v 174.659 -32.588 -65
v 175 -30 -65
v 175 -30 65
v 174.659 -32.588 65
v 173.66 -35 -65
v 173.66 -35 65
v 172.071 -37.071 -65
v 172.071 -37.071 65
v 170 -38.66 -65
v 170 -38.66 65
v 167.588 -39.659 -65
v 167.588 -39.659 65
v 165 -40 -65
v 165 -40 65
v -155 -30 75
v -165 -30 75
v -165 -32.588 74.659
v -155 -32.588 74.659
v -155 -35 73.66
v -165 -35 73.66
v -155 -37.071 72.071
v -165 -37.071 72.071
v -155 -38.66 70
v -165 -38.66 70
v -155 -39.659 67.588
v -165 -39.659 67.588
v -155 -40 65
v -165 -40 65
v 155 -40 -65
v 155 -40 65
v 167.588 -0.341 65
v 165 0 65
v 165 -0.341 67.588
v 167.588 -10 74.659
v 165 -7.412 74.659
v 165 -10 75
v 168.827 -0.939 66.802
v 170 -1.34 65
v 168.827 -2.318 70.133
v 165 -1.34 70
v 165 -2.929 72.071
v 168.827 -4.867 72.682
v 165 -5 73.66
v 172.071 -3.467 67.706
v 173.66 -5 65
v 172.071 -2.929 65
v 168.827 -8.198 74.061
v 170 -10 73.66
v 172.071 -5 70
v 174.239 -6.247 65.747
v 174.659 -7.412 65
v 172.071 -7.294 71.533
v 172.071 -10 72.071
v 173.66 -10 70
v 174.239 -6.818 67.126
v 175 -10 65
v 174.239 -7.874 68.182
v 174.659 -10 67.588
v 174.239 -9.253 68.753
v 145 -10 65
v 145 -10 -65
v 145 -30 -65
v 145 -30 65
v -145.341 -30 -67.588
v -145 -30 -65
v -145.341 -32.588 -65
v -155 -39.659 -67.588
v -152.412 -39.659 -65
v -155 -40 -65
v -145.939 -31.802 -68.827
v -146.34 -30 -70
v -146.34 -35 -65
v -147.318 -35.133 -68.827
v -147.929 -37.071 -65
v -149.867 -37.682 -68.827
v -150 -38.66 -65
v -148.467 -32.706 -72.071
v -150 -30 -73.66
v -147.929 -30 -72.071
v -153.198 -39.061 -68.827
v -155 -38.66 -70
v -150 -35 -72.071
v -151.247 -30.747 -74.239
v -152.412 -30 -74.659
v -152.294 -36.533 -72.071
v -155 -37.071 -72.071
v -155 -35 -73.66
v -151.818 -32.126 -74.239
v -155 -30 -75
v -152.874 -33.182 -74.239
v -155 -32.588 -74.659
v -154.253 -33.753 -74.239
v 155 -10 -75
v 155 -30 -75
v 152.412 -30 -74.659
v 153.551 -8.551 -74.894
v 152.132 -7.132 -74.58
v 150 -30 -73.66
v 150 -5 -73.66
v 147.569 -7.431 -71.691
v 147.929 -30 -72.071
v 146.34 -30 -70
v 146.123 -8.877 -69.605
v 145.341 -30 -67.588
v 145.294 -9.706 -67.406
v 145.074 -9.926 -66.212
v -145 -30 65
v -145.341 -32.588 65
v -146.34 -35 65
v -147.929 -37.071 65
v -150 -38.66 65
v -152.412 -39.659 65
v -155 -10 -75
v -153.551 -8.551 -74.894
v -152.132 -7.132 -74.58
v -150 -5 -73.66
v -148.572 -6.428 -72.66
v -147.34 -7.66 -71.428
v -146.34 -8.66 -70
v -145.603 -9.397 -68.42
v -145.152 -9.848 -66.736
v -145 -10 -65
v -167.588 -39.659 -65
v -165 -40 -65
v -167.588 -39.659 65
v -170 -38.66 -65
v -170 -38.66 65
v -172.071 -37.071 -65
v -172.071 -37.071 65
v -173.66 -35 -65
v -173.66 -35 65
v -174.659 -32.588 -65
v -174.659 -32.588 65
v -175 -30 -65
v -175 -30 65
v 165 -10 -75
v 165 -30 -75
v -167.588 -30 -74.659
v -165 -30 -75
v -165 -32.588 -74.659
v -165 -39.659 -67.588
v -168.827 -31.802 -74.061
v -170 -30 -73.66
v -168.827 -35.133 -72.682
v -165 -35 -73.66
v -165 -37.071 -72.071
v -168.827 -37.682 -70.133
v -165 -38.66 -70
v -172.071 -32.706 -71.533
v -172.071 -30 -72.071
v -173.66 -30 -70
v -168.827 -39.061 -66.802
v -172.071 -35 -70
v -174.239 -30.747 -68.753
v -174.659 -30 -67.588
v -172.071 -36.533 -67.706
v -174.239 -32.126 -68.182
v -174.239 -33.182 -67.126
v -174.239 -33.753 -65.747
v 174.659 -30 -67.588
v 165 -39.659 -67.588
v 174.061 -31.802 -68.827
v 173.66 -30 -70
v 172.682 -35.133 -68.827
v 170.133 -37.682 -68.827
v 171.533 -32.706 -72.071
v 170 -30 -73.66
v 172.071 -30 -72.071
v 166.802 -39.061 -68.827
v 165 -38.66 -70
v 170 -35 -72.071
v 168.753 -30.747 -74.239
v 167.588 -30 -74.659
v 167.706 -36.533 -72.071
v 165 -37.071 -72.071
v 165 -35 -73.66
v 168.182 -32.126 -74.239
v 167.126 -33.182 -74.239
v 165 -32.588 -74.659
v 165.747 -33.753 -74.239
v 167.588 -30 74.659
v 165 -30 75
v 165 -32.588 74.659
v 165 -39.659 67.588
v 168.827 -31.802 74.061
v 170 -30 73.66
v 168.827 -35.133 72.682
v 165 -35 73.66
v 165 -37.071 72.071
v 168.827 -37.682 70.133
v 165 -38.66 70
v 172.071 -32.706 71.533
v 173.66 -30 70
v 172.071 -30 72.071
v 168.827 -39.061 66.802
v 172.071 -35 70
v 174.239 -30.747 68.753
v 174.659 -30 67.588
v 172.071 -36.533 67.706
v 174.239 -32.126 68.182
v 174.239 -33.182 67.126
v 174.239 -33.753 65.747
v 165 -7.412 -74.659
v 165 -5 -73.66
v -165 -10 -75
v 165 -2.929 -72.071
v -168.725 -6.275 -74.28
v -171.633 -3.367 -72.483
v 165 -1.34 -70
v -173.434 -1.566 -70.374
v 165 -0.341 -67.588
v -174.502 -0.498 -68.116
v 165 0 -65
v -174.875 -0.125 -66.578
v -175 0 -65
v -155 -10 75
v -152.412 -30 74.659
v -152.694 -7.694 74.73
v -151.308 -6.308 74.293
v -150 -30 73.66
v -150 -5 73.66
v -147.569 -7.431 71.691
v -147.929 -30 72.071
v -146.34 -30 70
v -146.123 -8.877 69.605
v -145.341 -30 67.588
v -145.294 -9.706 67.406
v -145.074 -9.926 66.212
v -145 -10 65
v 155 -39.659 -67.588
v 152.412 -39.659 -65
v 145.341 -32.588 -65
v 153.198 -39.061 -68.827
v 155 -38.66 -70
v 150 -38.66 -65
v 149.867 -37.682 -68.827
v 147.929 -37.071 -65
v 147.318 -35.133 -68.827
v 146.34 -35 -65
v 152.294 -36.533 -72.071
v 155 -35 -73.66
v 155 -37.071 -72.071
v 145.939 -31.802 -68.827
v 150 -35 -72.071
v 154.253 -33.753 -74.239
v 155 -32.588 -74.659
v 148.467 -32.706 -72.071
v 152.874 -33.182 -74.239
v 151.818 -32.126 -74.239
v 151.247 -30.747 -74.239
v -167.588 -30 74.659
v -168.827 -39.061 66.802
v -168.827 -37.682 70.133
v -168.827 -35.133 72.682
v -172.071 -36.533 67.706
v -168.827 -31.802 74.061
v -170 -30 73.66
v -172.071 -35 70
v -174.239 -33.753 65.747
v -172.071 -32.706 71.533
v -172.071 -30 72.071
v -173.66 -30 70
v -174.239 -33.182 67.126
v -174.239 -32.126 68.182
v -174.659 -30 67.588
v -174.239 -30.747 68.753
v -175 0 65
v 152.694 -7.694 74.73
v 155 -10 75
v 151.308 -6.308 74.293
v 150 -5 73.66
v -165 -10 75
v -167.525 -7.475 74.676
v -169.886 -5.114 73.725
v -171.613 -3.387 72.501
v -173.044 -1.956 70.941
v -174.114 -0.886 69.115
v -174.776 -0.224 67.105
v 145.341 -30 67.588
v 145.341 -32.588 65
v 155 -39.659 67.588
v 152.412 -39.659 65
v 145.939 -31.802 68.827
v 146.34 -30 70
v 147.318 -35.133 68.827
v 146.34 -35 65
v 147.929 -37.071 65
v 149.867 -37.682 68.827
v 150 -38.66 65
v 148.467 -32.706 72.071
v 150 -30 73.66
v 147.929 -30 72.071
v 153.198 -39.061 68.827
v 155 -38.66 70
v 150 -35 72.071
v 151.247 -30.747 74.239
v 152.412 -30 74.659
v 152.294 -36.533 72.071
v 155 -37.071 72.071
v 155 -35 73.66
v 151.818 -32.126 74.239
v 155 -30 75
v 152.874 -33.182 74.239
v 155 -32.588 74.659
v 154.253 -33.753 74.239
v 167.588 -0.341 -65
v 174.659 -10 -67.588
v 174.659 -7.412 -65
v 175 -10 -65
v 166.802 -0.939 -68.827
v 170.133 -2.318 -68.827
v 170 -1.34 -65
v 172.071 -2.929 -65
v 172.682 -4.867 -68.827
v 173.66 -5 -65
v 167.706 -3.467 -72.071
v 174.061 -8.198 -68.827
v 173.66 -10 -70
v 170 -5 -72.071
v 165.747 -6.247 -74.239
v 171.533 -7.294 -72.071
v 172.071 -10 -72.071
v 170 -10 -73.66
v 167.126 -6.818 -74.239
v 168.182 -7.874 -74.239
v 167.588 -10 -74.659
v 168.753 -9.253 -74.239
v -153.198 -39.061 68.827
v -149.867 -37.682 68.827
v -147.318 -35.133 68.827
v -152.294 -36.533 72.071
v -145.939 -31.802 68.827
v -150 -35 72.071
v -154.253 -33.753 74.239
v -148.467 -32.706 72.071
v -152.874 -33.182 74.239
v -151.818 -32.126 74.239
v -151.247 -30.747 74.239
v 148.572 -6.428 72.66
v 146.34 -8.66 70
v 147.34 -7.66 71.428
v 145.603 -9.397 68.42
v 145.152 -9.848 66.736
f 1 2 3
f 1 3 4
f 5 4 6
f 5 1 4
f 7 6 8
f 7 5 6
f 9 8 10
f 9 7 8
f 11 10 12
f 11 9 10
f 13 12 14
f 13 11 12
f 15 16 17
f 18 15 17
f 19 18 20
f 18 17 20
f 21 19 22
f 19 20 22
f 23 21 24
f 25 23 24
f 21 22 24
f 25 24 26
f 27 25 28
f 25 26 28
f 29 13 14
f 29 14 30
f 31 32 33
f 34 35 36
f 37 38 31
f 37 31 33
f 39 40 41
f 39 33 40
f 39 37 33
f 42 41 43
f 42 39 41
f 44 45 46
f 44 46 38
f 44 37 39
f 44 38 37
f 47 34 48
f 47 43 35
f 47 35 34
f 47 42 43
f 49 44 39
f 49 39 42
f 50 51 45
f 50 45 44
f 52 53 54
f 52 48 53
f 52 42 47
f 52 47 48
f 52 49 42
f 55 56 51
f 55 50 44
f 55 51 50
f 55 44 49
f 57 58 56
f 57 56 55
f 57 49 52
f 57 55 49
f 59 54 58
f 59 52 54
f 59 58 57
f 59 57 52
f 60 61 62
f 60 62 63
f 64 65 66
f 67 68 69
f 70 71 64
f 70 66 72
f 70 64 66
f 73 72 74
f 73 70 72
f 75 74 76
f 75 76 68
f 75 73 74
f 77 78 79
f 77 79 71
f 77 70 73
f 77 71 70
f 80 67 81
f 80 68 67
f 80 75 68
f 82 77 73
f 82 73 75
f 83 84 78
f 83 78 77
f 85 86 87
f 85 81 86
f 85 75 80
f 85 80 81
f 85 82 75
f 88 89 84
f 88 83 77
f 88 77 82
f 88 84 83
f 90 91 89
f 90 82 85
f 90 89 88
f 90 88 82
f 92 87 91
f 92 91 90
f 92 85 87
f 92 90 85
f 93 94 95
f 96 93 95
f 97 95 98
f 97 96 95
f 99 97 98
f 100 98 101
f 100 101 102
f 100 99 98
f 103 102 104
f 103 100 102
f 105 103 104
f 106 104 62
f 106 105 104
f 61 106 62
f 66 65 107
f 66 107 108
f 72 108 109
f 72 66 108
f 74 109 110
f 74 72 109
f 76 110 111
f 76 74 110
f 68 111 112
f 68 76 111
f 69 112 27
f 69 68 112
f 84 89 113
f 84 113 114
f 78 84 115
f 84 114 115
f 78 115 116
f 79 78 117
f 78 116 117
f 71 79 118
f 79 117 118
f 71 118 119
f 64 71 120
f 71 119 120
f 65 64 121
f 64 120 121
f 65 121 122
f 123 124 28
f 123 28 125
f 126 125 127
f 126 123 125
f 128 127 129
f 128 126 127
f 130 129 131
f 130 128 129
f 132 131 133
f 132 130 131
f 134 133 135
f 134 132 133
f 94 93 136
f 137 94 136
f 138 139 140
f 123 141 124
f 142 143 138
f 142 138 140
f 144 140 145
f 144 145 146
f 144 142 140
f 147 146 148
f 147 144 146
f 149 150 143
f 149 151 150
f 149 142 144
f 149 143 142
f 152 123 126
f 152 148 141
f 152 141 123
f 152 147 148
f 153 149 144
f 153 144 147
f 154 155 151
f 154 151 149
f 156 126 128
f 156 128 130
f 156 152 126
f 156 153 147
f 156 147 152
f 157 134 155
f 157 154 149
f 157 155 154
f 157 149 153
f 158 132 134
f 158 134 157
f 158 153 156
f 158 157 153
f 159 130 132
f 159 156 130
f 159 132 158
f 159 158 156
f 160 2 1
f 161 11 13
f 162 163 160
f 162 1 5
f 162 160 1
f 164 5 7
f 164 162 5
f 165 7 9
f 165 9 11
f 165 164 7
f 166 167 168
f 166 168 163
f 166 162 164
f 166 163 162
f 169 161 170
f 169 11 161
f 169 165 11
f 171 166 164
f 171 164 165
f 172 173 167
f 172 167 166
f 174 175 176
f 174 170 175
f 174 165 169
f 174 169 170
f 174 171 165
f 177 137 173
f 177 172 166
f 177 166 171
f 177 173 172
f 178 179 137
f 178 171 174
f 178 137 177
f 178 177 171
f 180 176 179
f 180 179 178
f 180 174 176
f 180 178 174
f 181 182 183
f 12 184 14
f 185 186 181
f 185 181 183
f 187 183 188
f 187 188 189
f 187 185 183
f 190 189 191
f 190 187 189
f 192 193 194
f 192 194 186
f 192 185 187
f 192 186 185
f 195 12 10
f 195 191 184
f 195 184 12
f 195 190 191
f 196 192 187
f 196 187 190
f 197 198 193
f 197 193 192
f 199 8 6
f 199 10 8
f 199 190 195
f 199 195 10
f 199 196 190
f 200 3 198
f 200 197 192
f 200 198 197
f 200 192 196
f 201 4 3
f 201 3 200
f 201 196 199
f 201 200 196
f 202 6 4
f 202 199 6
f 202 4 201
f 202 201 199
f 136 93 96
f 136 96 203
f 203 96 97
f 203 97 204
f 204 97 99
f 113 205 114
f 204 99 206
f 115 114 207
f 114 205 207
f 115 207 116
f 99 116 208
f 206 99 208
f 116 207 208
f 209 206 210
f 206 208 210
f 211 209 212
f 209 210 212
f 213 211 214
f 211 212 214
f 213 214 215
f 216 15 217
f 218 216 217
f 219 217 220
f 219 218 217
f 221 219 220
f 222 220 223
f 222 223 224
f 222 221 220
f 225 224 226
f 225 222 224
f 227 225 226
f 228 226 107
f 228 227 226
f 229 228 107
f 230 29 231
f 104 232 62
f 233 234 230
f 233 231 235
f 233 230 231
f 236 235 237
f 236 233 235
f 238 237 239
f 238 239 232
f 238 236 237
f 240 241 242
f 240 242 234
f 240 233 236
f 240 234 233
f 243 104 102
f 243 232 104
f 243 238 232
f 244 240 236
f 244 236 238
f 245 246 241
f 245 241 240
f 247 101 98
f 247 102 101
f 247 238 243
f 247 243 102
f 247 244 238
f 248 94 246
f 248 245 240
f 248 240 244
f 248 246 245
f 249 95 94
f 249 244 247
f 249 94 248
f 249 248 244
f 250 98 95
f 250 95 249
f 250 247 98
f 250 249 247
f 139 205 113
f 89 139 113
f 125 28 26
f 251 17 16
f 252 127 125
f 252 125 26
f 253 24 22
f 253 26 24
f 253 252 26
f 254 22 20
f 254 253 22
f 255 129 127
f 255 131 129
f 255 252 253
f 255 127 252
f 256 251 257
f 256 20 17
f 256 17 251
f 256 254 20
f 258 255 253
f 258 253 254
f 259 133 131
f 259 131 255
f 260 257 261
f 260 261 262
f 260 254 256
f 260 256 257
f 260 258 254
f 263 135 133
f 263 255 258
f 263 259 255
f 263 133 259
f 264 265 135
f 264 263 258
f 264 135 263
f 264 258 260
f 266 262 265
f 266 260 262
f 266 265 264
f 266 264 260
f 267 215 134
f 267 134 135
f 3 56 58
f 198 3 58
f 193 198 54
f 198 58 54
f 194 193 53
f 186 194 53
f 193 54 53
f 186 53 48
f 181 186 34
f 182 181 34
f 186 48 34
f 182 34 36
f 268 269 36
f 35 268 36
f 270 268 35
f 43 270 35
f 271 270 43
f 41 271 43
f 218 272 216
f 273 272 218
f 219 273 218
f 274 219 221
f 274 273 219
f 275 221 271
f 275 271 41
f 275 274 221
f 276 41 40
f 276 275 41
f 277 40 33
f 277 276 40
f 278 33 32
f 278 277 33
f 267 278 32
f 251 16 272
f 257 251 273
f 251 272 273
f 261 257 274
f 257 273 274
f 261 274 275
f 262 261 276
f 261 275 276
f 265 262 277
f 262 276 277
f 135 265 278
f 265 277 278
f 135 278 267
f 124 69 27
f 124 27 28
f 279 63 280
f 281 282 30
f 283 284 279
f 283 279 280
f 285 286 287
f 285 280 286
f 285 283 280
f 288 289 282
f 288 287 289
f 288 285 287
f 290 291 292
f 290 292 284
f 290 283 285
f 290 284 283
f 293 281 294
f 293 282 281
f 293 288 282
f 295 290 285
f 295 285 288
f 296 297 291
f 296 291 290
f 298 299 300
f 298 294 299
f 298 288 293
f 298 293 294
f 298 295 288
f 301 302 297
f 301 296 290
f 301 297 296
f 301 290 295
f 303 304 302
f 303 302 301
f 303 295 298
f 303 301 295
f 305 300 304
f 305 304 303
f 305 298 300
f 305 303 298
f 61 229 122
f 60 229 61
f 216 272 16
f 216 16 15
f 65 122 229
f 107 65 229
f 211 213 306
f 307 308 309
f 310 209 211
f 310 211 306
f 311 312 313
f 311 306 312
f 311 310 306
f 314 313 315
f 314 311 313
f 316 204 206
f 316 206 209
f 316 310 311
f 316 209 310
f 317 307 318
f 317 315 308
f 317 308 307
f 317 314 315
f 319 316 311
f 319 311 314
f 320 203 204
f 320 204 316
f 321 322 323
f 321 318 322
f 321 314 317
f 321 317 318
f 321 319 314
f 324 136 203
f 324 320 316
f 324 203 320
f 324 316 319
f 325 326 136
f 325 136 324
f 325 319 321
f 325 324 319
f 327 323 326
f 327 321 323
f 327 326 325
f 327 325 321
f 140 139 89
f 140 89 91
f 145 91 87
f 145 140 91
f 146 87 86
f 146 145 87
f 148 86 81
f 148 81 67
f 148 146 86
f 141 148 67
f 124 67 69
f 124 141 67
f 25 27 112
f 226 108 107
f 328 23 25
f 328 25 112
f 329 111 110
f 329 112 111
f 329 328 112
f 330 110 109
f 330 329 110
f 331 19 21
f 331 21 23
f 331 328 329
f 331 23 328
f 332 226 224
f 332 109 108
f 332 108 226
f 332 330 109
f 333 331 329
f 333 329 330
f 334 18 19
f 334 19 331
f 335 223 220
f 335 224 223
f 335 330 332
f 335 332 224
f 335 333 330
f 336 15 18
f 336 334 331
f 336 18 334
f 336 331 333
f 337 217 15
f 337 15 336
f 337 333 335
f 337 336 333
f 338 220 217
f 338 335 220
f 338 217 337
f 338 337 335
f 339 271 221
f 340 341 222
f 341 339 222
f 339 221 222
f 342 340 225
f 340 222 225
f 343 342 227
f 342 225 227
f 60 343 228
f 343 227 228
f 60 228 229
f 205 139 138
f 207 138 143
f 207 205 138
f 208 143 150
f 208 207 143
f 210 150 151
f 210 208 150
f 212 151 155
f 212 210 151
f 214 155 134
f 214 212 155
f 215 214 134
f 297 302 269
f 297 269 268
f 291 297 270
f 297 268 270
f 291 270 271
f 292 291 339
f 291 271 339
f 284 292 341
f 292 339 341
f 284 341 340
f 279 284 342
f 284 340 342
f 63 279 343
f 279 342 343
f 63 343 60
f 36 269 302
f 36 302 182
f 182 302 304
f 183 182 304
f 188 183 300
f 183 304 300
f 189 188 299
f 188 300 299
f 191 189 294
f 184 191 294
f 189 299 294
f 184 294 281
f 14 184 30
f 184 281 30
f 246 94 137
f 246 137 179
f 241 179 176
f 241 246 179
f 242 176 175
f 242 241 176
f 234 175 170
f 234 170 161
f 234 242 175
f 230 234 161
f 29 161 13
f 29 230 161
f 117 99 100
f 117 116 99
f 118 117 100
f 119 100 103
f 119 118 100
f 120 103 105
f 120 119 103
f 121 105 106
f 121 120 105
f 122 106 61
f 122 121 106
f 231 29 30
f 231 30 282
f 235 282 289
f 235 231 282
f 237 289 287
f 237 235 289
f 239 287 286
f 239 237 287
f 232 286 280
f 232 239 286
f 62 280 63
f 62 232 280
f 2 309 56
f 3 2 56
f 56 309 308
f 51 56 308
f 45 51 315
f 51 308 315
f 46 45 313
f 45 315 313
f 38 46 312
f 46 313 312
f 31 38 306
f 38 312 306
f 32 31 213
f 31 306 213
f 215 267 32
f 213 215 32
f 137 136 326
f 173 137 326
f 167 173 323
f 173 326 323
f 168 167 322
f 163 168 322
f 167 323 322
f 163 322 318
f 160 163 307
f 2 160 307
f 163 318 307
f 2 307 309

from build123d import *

# Parameters (mm, degrees)
F0_W          = 350
F0_H          = 150
F1_DEPTH      = 10
F2_W          = 30
F2_H          = 150
F3_DEPTH      = 40
F4_T1_DEPTH   = 10
F4_T3_DEPTH   = 20
F4_T5_DEPTH   = 130
F4_T7_DEPTH   = 55
F4_T9_DEPTH   = 365
F4_T11_DEPTH  = 290
F4_T13_DEPTH  = 10
F4_S17_W      = 10.2
F4_S17_H      = 10.2
F4_T18_DEPTH  = 10.2
F4_S23_W      = 10.2
F4_S23_H      = 10.2
F4_T24_DEPTH  = 10.2
F4_S29_W      = 10.2
F4_S29_H      = 10.2
F4_T30_DEPTH  = 10.2
F4_S35_W      = 10.2
F4_S35_H      = 10.2
F4_T36_DEPTH  = 10.2
F4_S41_W      = 10.2
F4_S41_H      = 10.2
F4_T42_DEPTH  = 10.2
F4_S47_W      = 10.2
F4_S47_H      = 10.2
F4_T48_DEPTH  = 10.2
F4_S53_W      = 10.2
F4_S53_H      = 10.2
F4_T54_DEPTH  = 10.2
F4_S59_W      = 10.2
F4_S59_H      = 10.2
F4_T60_DEPTH  = 10.2
F4_S65_W      = 10.2
F4_S65_H      = 10.2
F4_T66_DEPTH  = 10.2
F4_S71_W      = 10.2
F4_S71_H      = 10.2
F4_T72_DEPTH  = 10.2
F4_T79_DEPTH  = 45
F4_T84_DEPTH  = 315
F4_T91_DEPTH  = 315
F4_T95_DEPTH  = 45
F4_T103_DEPTH = 45
F4_T108_DEPTH = 315
F4_T115_DEPTH = 315
F4_T119_DEPTH = 45


# Not quite as in the source:
# - a fillet or chamfer that OpenCascade refuses, or shapes differently, is made with other operations: its cross-section is extruded or revolved along the edge and cut away or added


with BuildPart() as f1:
    # F0 (on Front) → F1 (new body)
    with BuildSketch(Plane.XZ):
        Rectangle(F0_W, F0_H)
    extrude(amount=F1_DEPTH)

    # F2 (on face) → F3 (join)
    with BuildSketch(Plane(origin=(0, 0, 0), x_dir=(-1, 0, 0), z_dir=(0, 1, 0))):
        with Locations((-160, 0)):
            Rectangle(F2_W, F2_H)
        with Locations((160, 0)):
            Rectangle(F2_W, F2_H)
    extrude(amount=-F3_DEPTH)

    # F4: fillet of radius 10 on 21 edges, made by hand

    # F4_s2 → F4_t1 (cut)
    with BuildSketch(Plane.YZ.offset(155)):
        with BuildLine():
            ThreePointArc((-30, 75), (-37.0710678119, 72.0710678119), (-40, 65))
            Line((-40, 65), (-40, 75))
            Line((-40, 75), (-30, 75))
        make_face()
        with BuildLine():
            ThreePointArc((-30, -75), (-37.0710678119, -72.0710678119), (-40, -65))
            Line((-40, -65), (-40, -75))
            Line((-40, -75), (-30, -75))
        make_face()
    extrude(amount=F4_T1_DEPTH, mode=Mode.SUBTRACT)

    # F4_s4 → F4_t3 (cut)
    with BuildSketch(Plane.XZ.offset(10)):
        with BuildLine():
            ThreePointArc((155, 75), (147.9289321881, 72.0710678119), (145, 65))
            Line((145, 65), (145, 75))
            Line((145, 75), (155, 75))
        make_face()
        with BuildLine():
            ThreePointArc((165, -75), (172.0710678119, -72.0710678119), (175, -65))
            Line((175, -65), (175, -75))
            Line((175, -75), (165, -75))
        make_face()
        with BuildLine():
            ThreePointArc((155, -75), (147.9289321881, -72.0710678119), (145, -65))
            Line((145, -65), (145, -75))
            Line((145, -75), (155, -75))
        make_face()
        with BuildLine():
            ThreePointArc((175, 65), (172.0710678119, 72.0710678119), (165, 75))
            Line((165, 75), (175, 75))
            Line((175, 75), (175, 65))
        make_face()
        with BuildLine():
            ThreePointArc((-155, -75), (-147.9289321881, -72.0710678119), (-145, -65))
            Line((-145, -65), (-145, -75))
            Line((-145, -75), (-155, -75))
        make_face()
        with BuildLine():
            ThreePointArc((-155, 75), (-147.9289321881, 72.0710678119), (-145, 65))
            Line((-145, 65), (-145, 75))
            Line((-145, 75), (-155, 75))
        make_face()
    extrude(amount=F4_T3_DEPTH, mode=Mode.SUBTRACT)

    # F4_s6 → F4_t5 (cut)
    with BuildSketch(Plane.XY.offset(-65)):
        with BuildLine():
            ThreePointArc((175, -30), (172.0710678119, -37.0710678119), (165, -40))
            Line((165, -40), (175, -40))
            Line((175, -40), (175, -30))
        make_face()
        with BuildLine():
            ThreePointArc((175, -10), (172.0710678119, -2.9289321881), (165, 0))
            Line((165, 0), (175, 0))
            Line((175, 0), (175, -10))
        make_face()
        with BuildLine():
            ThreePointArc((-165, -40), (-172.0710678119, -37.0710678119), (-175, -30))
            Line((-175, -30), (-175, -40))
            Line((-175, -40), (-165, -40))
        make_face()
        with BuildLine():
            ThreePointArc((155, -40), (147.9289321881, -37.0710678119), (145, -30))
            Line((145, -30), (145, -40))
            Line((145, -40), (155, -40))
        make_face()
        with BuildLine():
            ThreePointArc((-145, -30), (-147.9289321881, -37.0710678119), (-155, -40))
            Line((-155, -40), (-145, -40))
            Line((-145, -40), (-145, -30))
        make_face()
    extrude(amount=F4_T5_DEPTH, mode=Mode.SUBTRACT)

    # F4_s8 → F4_t7 (cut)
    with BuildSketch(Plane.XZ.offset(-25)):
        with BuildLine():
            ThreePointArc((-165, -75), (-172.0710678119, -72.0710678119), (-175, -65))
            Line((-175, -65), (-175, -75))
            Line((-175, -75), (-165, -75))
        make_face()
        with BuildLine():
            ThreePointArc((-165, 75), (-172.0710678119, 72.0710678119), (-175, 65))
            Line((-175, 65), (-175, 75))
            Line((-175, 75), (-165, 75))
        make_face()
    extrude(amount=F4_T7_DEPTH, mode=Mode.SUBTRACT)

    # F4_s10 → F4_t9 (cut)
    with BuildSketch(Plane.YZ.offset(-200)):
        with BuildLine():
            ThreePointArc((-10, 75), (-2.9289321881, 72.0710678119), (0, 65))
            Line((0, 65), (0, 75))
            Line((0, 75), (-10, 75))
        make_face()
        with BuildLine():
            ThreePointArc((-10, -75), (-2.9289321881, -72.0710678119), (0, -65))
            Line((0, -65), (0, -75))
            Line((0, -75), (-10, -75))
        make_face()
    extrude(amount=F4_T9_DEPTH, mode=Mode.SUBTRACT)

    # F4_s12 → F4_t11 (cut)
    with BuildSketch(Plane.YZ.offset(-145)):
        with BuildLine():
            ThreePointArc((0, 75), (-7.0710678119, 72.0710678119), (-10, 65))
            Line((-10, 65), (-10, 75))
            Line((-10, 75), (0, 75))
        make_face()
        with BuildLine():
            ThreePointArc((0, -75), (-7.0710678119, -72.0710678119), (-10, -65))
            Line((-10, -65), (-10, -75))
            Line((-10, -75), (0, -75))
        make_face()
    extrude(amount=F4_T11_DEPTH, mode=Mode.SUBTRACT)

    # F4_s14 → F4_t13 (cut)
    with BuildSketch(Plane.YZ.offset(-165)):
        with BuildLine():
            ThreePointArc((-30, 75), (-37.0710678119, 72.0710678119), (-40, 65))
            Line((-40, 65), (-40, 75))
            Line((-40, 75), (-30, 75))
        make_face()
        with BuildLine():
            ThreePointArc((-30, -75), (-37.0710678119, -72.0710678119), (-40, -65))
            Line((-40, -65), (-40, -75))
            Line((-40, -75), (-30, -75))
        make_face()
    extrude(amount=F4_T13_DEPTH, mode=Mode.SUBTRACT)


with BuildPart() as f4_tool16:
    # F4_s17 → F4_t18 (new body)
    with BuildSketch(Plane.XY.offset(65)):
        with Locations((149.9, -35.1)):
            Rectangle(F4_S17_W, F4_S17_H)
    extrude(amount=F4_T18_DEPTH)

    # F4_s19 → F4_t20 (revolve, cut)
    with BuildSketch(Plane(origin=(155, -30, 65), x_dir=(0.7071067812, 0.7071067812, 0), z_dir=(0.7071067812, -0.7071067812, 0))):
        with BuildLine():
            ThreePointArc((0, -10), (10, 0), (0, 10))
            Line((0, 10), (0, -10))
        make_face()
    revolve(axis=Axis((155, -30, 65), (0, 0, 1)), mode=Mode.SUBTRACT)


with BuildPart() as f1_1:
    add(f1.part)

    # F4_t15: cut F4_tool16
    add(f4_tool16.part, mode=Mode.SUBTRACT)


with BuildPart() as f4_tool22:
    # F4_s23 → F4_t24 (new body)
    with BuildSketch(Plane.YZ.offset(165)):
        with Locations((-35.1, 70.1)):
            Rectangle(F4_S23_W, F4_S23_H)
    extrude(amount=F4_T24_DEPTH)

    # F4_s25 → F4_t26 (revolve, cut)
    with BuildSketch(Plane(origin=(165, -30, 65), x_dir=(0, 0.7071067812, -0.7071067812), z_dir=(0, -0.7071067812, -0.7071067812))):
        with BuildLine():
            ThreePointArc((0, -10), (10, 0), (0, 10))
            Line((0, 10), (0, -10))
        make_face()
    revolve(axis=Axis((165, -30, 65), (1, 0, 0)), mode=Mode.SUBTRACT)


with BuildPart() as f1_2:
    add(f1_1.part)

    # F4_t21: cut F4_tool22
    add(f4_tool22.part, mode=Mode.SUBTRACT)


with BuildPart() as f4_tool28:
    # F4_s29 → F4_t30 (new body)
    with BuildSketch(Plane.XY.offset(-65)):
        with Locations((170.1, -4.9)):
            Rectangle(F4_S29_W, F4_S29_H)
    extrude(amount=-F4_T30_DEPTH)

    # F4_s31 → F4_t32 (revolve, cut)
    with BuildSketch(Plane(origin=(165, -10, -65), x_dir=(-0.7071067812, -0.7071067812, 0), z_dir=(0.7071067812, -0.7071067812, 0))):
        with BuildLine():
            ThreePointArc((0, -10), (10, 0), (0, 10))
            Line((0, 10), (0, -10))
        make_face()
    revolve(axis=Axis((165, -10, -65), (0, 0, -1)), mode=Mode.SUBTRACT)


with BuildPart() as f1_3:
    add(f1_2.part)

    # F4_t27: cut F4_tool28
    add(f4_tool28.part, mode=Mode.SUBTRACT)


with BuildPart() as f4_tool34:
    # F4_s35 → F4_t36 (new body)
    with BuildSketch(Plane.XY.offset(-65)):
        with Locations((170.1, -35.1)):
            Rectangle(F4_S35_W, F4_S35_H)
    extrude(amount=-F4_T36_DEPTH)

    # F4_s37 → F4_t38 (revolve, cut)
    with BuildSketch(Plane(origin=(165, -30, -65), x_dir=(-0.7071067812, 0.7071067812, 0), z_dir=(-0.7071067812, -0.7071067812, 0))):
        with BuildLine():
            ThreePointArc((0, -10), (10, 0), (0, 10))
            Line((0, 10), (0, -10))
        make_face()
    revolve(axis=Axis((165, -30, -65), (0, 0, -1)), mode=Mode.SUBTRACT)


with BuildPart() as f1_4:
    add(f1_3.part)

    # F4_t33: cut F4_tool34
    add(f4_tool34.part, mode=Mode.SUBTRACT)


with BuildPart() as f4_tool40:
    # F4_s41 → F4_t42 (new body)
    with BuildSketch(Plane.XY.offset(-65)):
        with Locations((149.9, -35.1)):
            Rectangle(F4_S41_W, F4_S41_H)
    extrude(amount=-F4_T42_DEPTH)

    # F4_s43 → F4_t44 (revolve, cut)
    with BuildSketch(Plane(origin=(155, -30, -65), x_dir=(0.7071067812, 0.7071067812, 0), z_dir=(-0.7071067812, 0.7071067812, 0))):
        with BuildLine():
            ThreePointArc((0, -10), (10, 0), (0, 10))
            Line((0, 10), (0, -10))
        make_face()
    revolve(axis=Axis((155, -30, -65), (0, 0, -1)), mode=Mode.SUBTRACT)


with BuildPart() as f1_5:
    add(f1_4.part)

    # F4_t39: cut F4_tool40
    add(f4_tool40.part, mode=Mode.SUBTRACT)


with BuildPart() as f4_tool46:
    # F4_s47 → F4_t48 (new body)
    with BuildSketch(Plane.YZ.offset(165)):
        with Locations((-4.9, 70.1)):
            Rectangle(F4_S47_W, F4_S47_H)
    extrude(amount=F4_T48_DEPTH)

    # F4_s49 → F4_t50 (revolve, cut)
    with BuildSketch(Plane(origin=(165, -10, 65), x_dir=(0, -0.7071067812, -0.7071067812), z_dir=(0, -0.7071067812, 0.7071067812))):
        with BuildLine():
            ThreePointArc((0, -10), (10, 0), (0, 10))
            Line((0, 10), (0, -10))
        make_face()
    revolve(axis=Axis((165, -10, 65), (1, 0, 0)), mode=Mode.SUBTRACT)


with BuildPart() as f1_6:
    add(f1_5.part)

    # F4_t45: cut F4_tool46
    add(f4_tool46.part, mode=Mode.SUBTRACT)


with BuildPart() as f4_tool52:
    # F4_s53 → F4_t54 (new body)
    with BuildSketch(Plane.XY.offset(-65)):
        with Locations((-149.9, -35.1)):
            Rectangle(F4_S53_W, F4_S53_H)
    extrude(amount=-F4_T54_DEPTH)

    # F4_s55 → F4_t56 (revolve, cut)
    with BuildSketch(Plane(origin=(-155, -30, -65), x_dir=(-0.7071067812, 0.7071067812, 0), z_dir=(-0.7071067812, -0.7071067812, 0))):
        with BuildLine():
            ThreePointArc((0, -10), (10, 0), (0, 10))
            Line((0, 10), (0, -10))
        make_face()
    revolve(axis=Axis((-155, -30, -65), (0, 0, -1)), mode=Mode.SUBTRACT)


with BuildPart() as f1_7:
    add(f1_6.part)

    # F4_t51: cut F4_tool52
    add(f4_tool52.part, mode=Mode.SUBTRACT)


with BuildPart() as f4_tool58:
    # F4_s59 → F4_t60 (new body)
    with BuildSketch(Plane.YZ.offset(-165)):
        with Locations((-35.1, -70.1)):
            Rectangle(F4_S59_W, F4_S59_H)
    extrude(amount=-F4_T60_DEPTH)

    # F4_s61 → F4_t62 (revolve, cut)
    with BuildSketch(Plane(origin=(-165, -30, -65), x_dir=(0, 0.7071067812, 0.7071067812), z_dir=(0, -0.7071067812, 0.7071067812))):
        with BuildLine():
            ThreePointArc((0, -10), (10, 0), (0, 10))
            Line((0, 10), (0, -10))
        make_face()
    revolve(axis=Axis((-165, -30, -65), (-1, 0, 0)), mode=Mode.SUBTRACT)


with BuildPart() as f1_8:
    add(f1_7.part)

    # F4_t57: cut F4_tool58
    add(f4_tool58.part, mode=Mode.SUBTRACT)


with BuildPart() as f4_tool64:
    # F4_s65 → F4_t66 (new body)
    with BuildSketch(Plane.YZ.offset(-165)):
        with Locations((-35.1, 70.1)):
            Rectangle(F4_S65_W, F4_S65_H)
    extrude(amount=-F4_T66_DEPTH)

    # F4_s67 → F4_t68 (revolve, cut)
    with BuildSketch(Plane(origin=(-165, -30, 65), x_dir=(0, 0.7071067812, -0.7071067812), z_dir=(0, 0.7071067812, 0.7071067812))):
        with BuildLine():
            ThreePointArc((0, -10), (10, 0), (0, 10))
            Line((0, 10), (0, -10))
        make_face()
    revolve(axis=Axis((-165, -30, 65), (-1, 0, 0)), mode=Mode.SUBTRACT)


with BuildPart() as f1_9:
    add(f1_8.part)

    # F4_t63: cut F4_tool64
    add(f4_tool64.part, mode=Mode.SUBTRACT)


with BuildPart() as f4_tool70:
    # F4_s71 → F4_t72 (new body)
    with BuildSketch(Plane.XY.offset(65)):
        with Locations((-149.9, -35.1)):
            Rectangle(F4_S71_W, F4_S71_H)
    extrude(amount=F4_T72_DEPTH)

    # F4_s73 → F4_t74 (revolve, cut)
    with BuildSketch(Plane(origin=(-155, -30, 65), x_dir=(-0.7071067812, 0.7071067812, 0), z_dir=(0.7071067812, 0.7071067812, 0))):
        with BuildLine():
            ThreePointArc((0, -10), (10, 0), (0, 10))
            Line((0, 10), (0, -10))
        make_face()
    revolve(axis=Axis((-155, -30, 65), (0, 0, 1)), mode=Mode.SUBTRACT)


with BuildPart() as f1_10:
    add(f1_9.part)

    # F4_t69: cut F4_tool70
    add(f4_tool70.part, mode=Mode.SUBTRACT)


with BuildPart() as f4_tool77:
    # F4_s78 → F4_t79 (new body)
    with BuildSketch(Plane.XZ.offset(-15)):
        with BuildLine():
            ThreePointArc((155, 75), (147.9289321881, 72.0710678119), (145, 65))
            Line((145, 65), (145, 75))
            Line((145, 75), (155, 75))
        make_face()
    extrude(amount=F4_T79_DEPTH)

    split(bisect_by=Plane.XZ.offset(10), keep=Keep.BOTTOM)

    split(bisect_by=Plane.XZ, keep=Keep.TOP)


with BuildPart() as f4_tool82:
    # F4_s83 → F4_t84 (new body)
    with BuildSketch(Plane.YZ.offset(170)):
        with BuildLine():
            ThreePointArc((0, 75), (-7.0710678119, 72.0710678119), (-10, 65))
            Line((-10, 65), (-10, 75))
            Line((-10, 75), (0, 75))
        make_face()
    extrude(amount=-F4_T84_DEPTH)

    split(bisect_by=Plane.YZ.offset(145), keep=Keep.TOP)


with BuildPart() as f4_tool77_1:
    add(f4_tool77.part)

    # F4_t86: intersect F4_tool82
    add(f4_tool82.part, mode=Mode.INTERSECT)


with BuildPart() as f1_11:
    add(f1_10.part)

    # F4_t75: cut F4_tool77
    add(f4_tool77_1.part, mode=Mode.SUBTRACT)


with BuildPart() as f4_tool89:
    # F4_s90 → F4_t91 (new body)
    with BuildSketch(Plane.YZ.offset(-145)):
        with BuildLine():
            ThreePointArc((0, -75), (-7.0710678119, -72.0710678119), (-10, -65))
            Line((-10, -65), (-10, -75))
            Line((-10, -75), (0, -75))
        make_face()
    extrude(amount=F4_T91_DEPTH)

    split(bisect_by=Plane.YZ.offset(145), keep=Keep.TOP)


with BuildPart() as f4_tool93:
    # F4_s94 → F4_t95 (new body)
    with BuildSketch(Plane.XZ.offset(-15)):
        with BuildLine():
            ThreePointArc((155, -75), (147.9289321881, -72.0710678119), (145, -65))
            Line((145, -65), (145, -75))
            Line((145, -75), (155, -75))
        make_face()
    extrude(amount=F4_T95_DEPTH)

    split(bisect_by=Plane.XZ.offset(10), keep=Keep.BOTTOM)

    split(bisect_by=Plane.XZ, keep=Keep.TOP)


with BuildPart() as f4_tool89_1:
    add(f4_tool89.part)

    # F4_t98: intersect F4_tool93
    add(f4_tool93.part, mode=Mode.INTERSECT)


with BuildPart() as f1_12:
    add(f1_11.part)

    # F4_t87: cut F4_tool89
    add(f4_tool89_1.part, mode=Mode.SUBTRACT)


with BuildPart() as f4_tool101:
    # F4_s102 → F4_t103 (new body)
    with BuildSketch(Plane.XZ.offset(-15)):
        with BuildLine():
            ThreePointArc((-155, -75), (-147.9289321881, -72.0710678119), (-145, -65))
            Line((-145, -65), (-145, -75))
            Line((-145, -75), (-155, -75))
        make_face()
    extrude(amount=F4_T103_DEPTH)

    split(bisect_by=Plane.XZ.offset(10), keep=Keep.BOTTOM)

    split(bisect_by=Plane.XZ, keep=Keep.TOP)


with BuildPart() as f4_tool106:
    # F4_s107 → F4_t108 (new body)
    with BuildSketch(Plane.YZ.offset(-170)):
        with BuildLine():
            ThreePointArc((0, -75), (-7.0710678119, -72.0710678119), (-10, -65))
            Line((-10, -65), (-10, -75))
            Line((-10, -75), (0, -75))
        make_face()
    extrude(amount=F4_T108_DEPTH)

    split(bisect_by=Plane.YZ.offset(-145), keep=Keep.BOTTOM)


with BuildPart() as f4_tool101_1:
    add(f4_tool101.part)

    # F4_t110: intersect F4_tool106
    add(f4_tool106.part, mode=Mode.INTERSECT)


with BuildPart() as f1_13:
    add(f1_12.part)

    # F4_t99: cut F4_tool101
    add(f4_tool101_1.part, mode=Mode.SUBTRACT)


with BuildPart() as f4_tool113:
    # F4_s114 → F4_t115 (new body)
    with BuildSketch(Plane.YZ.offset(145)):
        with BuildLine():
            ThreePointArc((0, 75), (-7.0710678119, 72.0710678119), (-10, 65))
            Line((-10, 65), (-10, 75))
            Line((-10, 75), (0, 75))
        make_face()
    extrude(amount=-F4_T115_DEPTH)

    split(bisect_by=Plane.YZ.offset(-145), keep=Keep.BOTTOM)


with BuildPart() as f4_tool117:
    # F4_s118 → F4_t119 (new body)
    with BuildSketch(Plane.XZ.offset(-15)):
        with BuildLine():
            ThreePointArc((-155, 75), (-147.9289321881, 72.0710678119), (-145, 65))
            Line((-145, 65), (-145, 75))
            Line((-145, 75), (-155, 75))
        make_face()
    extrude(amount=F4_T119_DEPTH)

    split(bisect_by=Plane.XZ.offset(10), keep=Keep.BOTTOM)

    split(bisect_by=Plane.XZ, keep=Keep.TOP)


with BuildPart() as f4_tool113_1:
    add(f4_tool113.part)

    # F4_t122: intersect F4_tool117
    add(f4_tool117.part, mode=Mode.INTERSECT)


with BuildPart() as f1_14:
    add(f1_13.part)

    # F4_t111: cut F4_tool113
    add(f4_tool113_1.part, mode=Mode.SUBTRACT)


solid = f1_14.part
